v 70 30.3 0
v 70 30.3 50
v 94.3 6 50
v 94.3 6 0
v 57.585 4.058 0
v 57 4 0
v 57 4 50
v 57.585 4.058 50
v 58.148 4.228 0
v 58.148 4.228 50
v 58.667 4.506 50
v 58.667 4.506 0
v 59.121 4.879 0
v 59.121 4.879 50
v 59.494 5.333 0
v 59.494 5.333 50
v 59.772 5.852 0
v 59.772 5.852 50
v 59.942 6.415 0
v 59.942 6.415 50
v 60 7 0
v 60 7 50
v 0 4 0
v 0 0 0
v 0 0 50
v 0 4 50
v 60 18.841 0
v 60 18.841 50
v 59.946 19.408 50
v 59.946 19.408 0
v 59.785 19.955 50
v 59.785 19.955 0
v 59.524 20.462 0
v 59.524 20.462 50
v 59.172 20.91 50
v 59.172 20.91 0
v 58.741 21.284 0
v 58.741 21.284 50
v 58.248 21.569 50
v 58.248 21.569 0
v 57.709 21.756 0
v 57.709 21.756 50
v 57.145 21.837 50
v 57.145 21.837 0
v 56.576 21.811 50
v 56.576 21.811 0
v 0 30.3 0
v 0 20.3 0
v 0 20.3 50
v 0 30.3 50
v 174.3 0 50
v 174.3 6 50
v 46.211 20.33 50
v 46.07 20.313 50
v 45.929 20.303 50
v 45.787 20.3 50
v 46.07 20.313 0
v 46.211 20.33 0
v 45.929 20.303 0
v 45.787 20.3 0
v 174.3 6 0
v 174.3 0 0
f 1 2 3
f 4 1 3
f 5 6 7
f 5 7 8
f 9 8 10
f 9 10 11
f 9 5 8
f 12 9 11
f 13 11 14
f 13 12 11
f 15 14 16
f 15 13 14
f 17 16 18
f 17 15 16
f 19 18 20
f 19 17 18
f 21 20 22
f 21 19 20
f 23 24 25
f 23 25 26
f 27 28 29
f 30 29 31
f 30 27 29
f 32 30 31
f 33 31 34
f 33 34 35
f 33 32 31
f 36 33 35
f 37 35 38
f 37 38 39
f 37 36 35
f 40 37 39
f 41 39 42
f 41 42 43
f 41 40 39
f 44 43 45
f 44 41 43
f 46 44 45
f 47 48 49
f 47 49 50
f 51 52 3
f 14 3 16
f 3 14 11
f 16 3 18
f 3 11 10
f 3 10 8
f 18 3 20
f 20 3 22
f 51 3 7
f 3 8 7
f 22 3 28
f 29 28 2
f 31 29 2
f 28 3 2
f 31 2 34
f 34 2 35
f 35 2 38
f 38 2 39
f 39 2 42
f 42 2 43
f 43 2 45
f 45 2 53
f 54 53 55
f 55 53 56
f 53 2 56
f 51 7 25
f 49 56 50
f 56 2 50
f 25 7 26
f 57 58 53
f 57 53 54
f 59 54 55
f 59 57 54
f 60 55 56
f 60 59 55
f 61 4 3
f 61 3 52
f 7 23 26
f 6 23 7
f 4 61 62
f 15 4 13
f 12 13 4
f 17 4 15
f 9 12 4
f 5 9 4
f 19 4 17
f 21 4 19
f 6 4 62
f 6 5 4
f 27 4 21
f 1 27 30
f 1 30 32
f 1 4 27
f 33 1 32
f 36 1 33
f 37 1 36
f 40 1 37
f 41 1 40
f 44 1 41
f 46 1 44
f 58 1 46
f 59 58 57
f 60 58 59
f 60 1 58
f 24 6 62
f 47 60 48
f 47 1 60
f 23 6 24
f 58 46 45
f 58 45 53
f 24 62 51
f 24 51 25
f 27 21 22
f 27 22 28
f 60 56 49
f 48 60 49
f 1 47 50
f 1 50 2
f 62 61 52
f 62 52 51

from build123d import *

# Parameters (mm, degrees)
BOSS_EXTRUDE1_DEPTH = 50


with BuildPart() as part:
    # Sketch1 → Boss-Extrude1 (new body)
    with BuildSketch(Plane.XY):
        with BuildLine():
            Line((0, 0), (0, 4))
            Line((0, 4), (57, 4))
            ThreePointArc((57, 4), (59.121320344, 4.878679656), (60, 7))
            Line((60, 7), (60, 18.840970938))
            ThreePointArc((60, 18.840970938), (58.965605224, 21.107332803), (56.575735931, 21.810819419))
            Line((56.575735931, 21.810819419), (46.211060633, 20.330151519))
            ThreePointArc((46.211060633, 20.330151519), (45.999463625, 20.307547374), (45.786796564, 20.3))
            Line((45.786796564, 20.3), (0, 20.3))
            Line((0, 20.3), (0, 30.3))
            Line((0, 30.3), (70, 30.3))
            Line((70, 30.3), (94.3, 6))
            Line((94.3, 6), (174.3, 6))
            Line((174.3, 6), (174.3, 0))
            Line((174.3, 0), (0, 0))
        make_face()
    extrude(amount=BOSS_EXTRUDE1_DEPTH)


solid = part.part
